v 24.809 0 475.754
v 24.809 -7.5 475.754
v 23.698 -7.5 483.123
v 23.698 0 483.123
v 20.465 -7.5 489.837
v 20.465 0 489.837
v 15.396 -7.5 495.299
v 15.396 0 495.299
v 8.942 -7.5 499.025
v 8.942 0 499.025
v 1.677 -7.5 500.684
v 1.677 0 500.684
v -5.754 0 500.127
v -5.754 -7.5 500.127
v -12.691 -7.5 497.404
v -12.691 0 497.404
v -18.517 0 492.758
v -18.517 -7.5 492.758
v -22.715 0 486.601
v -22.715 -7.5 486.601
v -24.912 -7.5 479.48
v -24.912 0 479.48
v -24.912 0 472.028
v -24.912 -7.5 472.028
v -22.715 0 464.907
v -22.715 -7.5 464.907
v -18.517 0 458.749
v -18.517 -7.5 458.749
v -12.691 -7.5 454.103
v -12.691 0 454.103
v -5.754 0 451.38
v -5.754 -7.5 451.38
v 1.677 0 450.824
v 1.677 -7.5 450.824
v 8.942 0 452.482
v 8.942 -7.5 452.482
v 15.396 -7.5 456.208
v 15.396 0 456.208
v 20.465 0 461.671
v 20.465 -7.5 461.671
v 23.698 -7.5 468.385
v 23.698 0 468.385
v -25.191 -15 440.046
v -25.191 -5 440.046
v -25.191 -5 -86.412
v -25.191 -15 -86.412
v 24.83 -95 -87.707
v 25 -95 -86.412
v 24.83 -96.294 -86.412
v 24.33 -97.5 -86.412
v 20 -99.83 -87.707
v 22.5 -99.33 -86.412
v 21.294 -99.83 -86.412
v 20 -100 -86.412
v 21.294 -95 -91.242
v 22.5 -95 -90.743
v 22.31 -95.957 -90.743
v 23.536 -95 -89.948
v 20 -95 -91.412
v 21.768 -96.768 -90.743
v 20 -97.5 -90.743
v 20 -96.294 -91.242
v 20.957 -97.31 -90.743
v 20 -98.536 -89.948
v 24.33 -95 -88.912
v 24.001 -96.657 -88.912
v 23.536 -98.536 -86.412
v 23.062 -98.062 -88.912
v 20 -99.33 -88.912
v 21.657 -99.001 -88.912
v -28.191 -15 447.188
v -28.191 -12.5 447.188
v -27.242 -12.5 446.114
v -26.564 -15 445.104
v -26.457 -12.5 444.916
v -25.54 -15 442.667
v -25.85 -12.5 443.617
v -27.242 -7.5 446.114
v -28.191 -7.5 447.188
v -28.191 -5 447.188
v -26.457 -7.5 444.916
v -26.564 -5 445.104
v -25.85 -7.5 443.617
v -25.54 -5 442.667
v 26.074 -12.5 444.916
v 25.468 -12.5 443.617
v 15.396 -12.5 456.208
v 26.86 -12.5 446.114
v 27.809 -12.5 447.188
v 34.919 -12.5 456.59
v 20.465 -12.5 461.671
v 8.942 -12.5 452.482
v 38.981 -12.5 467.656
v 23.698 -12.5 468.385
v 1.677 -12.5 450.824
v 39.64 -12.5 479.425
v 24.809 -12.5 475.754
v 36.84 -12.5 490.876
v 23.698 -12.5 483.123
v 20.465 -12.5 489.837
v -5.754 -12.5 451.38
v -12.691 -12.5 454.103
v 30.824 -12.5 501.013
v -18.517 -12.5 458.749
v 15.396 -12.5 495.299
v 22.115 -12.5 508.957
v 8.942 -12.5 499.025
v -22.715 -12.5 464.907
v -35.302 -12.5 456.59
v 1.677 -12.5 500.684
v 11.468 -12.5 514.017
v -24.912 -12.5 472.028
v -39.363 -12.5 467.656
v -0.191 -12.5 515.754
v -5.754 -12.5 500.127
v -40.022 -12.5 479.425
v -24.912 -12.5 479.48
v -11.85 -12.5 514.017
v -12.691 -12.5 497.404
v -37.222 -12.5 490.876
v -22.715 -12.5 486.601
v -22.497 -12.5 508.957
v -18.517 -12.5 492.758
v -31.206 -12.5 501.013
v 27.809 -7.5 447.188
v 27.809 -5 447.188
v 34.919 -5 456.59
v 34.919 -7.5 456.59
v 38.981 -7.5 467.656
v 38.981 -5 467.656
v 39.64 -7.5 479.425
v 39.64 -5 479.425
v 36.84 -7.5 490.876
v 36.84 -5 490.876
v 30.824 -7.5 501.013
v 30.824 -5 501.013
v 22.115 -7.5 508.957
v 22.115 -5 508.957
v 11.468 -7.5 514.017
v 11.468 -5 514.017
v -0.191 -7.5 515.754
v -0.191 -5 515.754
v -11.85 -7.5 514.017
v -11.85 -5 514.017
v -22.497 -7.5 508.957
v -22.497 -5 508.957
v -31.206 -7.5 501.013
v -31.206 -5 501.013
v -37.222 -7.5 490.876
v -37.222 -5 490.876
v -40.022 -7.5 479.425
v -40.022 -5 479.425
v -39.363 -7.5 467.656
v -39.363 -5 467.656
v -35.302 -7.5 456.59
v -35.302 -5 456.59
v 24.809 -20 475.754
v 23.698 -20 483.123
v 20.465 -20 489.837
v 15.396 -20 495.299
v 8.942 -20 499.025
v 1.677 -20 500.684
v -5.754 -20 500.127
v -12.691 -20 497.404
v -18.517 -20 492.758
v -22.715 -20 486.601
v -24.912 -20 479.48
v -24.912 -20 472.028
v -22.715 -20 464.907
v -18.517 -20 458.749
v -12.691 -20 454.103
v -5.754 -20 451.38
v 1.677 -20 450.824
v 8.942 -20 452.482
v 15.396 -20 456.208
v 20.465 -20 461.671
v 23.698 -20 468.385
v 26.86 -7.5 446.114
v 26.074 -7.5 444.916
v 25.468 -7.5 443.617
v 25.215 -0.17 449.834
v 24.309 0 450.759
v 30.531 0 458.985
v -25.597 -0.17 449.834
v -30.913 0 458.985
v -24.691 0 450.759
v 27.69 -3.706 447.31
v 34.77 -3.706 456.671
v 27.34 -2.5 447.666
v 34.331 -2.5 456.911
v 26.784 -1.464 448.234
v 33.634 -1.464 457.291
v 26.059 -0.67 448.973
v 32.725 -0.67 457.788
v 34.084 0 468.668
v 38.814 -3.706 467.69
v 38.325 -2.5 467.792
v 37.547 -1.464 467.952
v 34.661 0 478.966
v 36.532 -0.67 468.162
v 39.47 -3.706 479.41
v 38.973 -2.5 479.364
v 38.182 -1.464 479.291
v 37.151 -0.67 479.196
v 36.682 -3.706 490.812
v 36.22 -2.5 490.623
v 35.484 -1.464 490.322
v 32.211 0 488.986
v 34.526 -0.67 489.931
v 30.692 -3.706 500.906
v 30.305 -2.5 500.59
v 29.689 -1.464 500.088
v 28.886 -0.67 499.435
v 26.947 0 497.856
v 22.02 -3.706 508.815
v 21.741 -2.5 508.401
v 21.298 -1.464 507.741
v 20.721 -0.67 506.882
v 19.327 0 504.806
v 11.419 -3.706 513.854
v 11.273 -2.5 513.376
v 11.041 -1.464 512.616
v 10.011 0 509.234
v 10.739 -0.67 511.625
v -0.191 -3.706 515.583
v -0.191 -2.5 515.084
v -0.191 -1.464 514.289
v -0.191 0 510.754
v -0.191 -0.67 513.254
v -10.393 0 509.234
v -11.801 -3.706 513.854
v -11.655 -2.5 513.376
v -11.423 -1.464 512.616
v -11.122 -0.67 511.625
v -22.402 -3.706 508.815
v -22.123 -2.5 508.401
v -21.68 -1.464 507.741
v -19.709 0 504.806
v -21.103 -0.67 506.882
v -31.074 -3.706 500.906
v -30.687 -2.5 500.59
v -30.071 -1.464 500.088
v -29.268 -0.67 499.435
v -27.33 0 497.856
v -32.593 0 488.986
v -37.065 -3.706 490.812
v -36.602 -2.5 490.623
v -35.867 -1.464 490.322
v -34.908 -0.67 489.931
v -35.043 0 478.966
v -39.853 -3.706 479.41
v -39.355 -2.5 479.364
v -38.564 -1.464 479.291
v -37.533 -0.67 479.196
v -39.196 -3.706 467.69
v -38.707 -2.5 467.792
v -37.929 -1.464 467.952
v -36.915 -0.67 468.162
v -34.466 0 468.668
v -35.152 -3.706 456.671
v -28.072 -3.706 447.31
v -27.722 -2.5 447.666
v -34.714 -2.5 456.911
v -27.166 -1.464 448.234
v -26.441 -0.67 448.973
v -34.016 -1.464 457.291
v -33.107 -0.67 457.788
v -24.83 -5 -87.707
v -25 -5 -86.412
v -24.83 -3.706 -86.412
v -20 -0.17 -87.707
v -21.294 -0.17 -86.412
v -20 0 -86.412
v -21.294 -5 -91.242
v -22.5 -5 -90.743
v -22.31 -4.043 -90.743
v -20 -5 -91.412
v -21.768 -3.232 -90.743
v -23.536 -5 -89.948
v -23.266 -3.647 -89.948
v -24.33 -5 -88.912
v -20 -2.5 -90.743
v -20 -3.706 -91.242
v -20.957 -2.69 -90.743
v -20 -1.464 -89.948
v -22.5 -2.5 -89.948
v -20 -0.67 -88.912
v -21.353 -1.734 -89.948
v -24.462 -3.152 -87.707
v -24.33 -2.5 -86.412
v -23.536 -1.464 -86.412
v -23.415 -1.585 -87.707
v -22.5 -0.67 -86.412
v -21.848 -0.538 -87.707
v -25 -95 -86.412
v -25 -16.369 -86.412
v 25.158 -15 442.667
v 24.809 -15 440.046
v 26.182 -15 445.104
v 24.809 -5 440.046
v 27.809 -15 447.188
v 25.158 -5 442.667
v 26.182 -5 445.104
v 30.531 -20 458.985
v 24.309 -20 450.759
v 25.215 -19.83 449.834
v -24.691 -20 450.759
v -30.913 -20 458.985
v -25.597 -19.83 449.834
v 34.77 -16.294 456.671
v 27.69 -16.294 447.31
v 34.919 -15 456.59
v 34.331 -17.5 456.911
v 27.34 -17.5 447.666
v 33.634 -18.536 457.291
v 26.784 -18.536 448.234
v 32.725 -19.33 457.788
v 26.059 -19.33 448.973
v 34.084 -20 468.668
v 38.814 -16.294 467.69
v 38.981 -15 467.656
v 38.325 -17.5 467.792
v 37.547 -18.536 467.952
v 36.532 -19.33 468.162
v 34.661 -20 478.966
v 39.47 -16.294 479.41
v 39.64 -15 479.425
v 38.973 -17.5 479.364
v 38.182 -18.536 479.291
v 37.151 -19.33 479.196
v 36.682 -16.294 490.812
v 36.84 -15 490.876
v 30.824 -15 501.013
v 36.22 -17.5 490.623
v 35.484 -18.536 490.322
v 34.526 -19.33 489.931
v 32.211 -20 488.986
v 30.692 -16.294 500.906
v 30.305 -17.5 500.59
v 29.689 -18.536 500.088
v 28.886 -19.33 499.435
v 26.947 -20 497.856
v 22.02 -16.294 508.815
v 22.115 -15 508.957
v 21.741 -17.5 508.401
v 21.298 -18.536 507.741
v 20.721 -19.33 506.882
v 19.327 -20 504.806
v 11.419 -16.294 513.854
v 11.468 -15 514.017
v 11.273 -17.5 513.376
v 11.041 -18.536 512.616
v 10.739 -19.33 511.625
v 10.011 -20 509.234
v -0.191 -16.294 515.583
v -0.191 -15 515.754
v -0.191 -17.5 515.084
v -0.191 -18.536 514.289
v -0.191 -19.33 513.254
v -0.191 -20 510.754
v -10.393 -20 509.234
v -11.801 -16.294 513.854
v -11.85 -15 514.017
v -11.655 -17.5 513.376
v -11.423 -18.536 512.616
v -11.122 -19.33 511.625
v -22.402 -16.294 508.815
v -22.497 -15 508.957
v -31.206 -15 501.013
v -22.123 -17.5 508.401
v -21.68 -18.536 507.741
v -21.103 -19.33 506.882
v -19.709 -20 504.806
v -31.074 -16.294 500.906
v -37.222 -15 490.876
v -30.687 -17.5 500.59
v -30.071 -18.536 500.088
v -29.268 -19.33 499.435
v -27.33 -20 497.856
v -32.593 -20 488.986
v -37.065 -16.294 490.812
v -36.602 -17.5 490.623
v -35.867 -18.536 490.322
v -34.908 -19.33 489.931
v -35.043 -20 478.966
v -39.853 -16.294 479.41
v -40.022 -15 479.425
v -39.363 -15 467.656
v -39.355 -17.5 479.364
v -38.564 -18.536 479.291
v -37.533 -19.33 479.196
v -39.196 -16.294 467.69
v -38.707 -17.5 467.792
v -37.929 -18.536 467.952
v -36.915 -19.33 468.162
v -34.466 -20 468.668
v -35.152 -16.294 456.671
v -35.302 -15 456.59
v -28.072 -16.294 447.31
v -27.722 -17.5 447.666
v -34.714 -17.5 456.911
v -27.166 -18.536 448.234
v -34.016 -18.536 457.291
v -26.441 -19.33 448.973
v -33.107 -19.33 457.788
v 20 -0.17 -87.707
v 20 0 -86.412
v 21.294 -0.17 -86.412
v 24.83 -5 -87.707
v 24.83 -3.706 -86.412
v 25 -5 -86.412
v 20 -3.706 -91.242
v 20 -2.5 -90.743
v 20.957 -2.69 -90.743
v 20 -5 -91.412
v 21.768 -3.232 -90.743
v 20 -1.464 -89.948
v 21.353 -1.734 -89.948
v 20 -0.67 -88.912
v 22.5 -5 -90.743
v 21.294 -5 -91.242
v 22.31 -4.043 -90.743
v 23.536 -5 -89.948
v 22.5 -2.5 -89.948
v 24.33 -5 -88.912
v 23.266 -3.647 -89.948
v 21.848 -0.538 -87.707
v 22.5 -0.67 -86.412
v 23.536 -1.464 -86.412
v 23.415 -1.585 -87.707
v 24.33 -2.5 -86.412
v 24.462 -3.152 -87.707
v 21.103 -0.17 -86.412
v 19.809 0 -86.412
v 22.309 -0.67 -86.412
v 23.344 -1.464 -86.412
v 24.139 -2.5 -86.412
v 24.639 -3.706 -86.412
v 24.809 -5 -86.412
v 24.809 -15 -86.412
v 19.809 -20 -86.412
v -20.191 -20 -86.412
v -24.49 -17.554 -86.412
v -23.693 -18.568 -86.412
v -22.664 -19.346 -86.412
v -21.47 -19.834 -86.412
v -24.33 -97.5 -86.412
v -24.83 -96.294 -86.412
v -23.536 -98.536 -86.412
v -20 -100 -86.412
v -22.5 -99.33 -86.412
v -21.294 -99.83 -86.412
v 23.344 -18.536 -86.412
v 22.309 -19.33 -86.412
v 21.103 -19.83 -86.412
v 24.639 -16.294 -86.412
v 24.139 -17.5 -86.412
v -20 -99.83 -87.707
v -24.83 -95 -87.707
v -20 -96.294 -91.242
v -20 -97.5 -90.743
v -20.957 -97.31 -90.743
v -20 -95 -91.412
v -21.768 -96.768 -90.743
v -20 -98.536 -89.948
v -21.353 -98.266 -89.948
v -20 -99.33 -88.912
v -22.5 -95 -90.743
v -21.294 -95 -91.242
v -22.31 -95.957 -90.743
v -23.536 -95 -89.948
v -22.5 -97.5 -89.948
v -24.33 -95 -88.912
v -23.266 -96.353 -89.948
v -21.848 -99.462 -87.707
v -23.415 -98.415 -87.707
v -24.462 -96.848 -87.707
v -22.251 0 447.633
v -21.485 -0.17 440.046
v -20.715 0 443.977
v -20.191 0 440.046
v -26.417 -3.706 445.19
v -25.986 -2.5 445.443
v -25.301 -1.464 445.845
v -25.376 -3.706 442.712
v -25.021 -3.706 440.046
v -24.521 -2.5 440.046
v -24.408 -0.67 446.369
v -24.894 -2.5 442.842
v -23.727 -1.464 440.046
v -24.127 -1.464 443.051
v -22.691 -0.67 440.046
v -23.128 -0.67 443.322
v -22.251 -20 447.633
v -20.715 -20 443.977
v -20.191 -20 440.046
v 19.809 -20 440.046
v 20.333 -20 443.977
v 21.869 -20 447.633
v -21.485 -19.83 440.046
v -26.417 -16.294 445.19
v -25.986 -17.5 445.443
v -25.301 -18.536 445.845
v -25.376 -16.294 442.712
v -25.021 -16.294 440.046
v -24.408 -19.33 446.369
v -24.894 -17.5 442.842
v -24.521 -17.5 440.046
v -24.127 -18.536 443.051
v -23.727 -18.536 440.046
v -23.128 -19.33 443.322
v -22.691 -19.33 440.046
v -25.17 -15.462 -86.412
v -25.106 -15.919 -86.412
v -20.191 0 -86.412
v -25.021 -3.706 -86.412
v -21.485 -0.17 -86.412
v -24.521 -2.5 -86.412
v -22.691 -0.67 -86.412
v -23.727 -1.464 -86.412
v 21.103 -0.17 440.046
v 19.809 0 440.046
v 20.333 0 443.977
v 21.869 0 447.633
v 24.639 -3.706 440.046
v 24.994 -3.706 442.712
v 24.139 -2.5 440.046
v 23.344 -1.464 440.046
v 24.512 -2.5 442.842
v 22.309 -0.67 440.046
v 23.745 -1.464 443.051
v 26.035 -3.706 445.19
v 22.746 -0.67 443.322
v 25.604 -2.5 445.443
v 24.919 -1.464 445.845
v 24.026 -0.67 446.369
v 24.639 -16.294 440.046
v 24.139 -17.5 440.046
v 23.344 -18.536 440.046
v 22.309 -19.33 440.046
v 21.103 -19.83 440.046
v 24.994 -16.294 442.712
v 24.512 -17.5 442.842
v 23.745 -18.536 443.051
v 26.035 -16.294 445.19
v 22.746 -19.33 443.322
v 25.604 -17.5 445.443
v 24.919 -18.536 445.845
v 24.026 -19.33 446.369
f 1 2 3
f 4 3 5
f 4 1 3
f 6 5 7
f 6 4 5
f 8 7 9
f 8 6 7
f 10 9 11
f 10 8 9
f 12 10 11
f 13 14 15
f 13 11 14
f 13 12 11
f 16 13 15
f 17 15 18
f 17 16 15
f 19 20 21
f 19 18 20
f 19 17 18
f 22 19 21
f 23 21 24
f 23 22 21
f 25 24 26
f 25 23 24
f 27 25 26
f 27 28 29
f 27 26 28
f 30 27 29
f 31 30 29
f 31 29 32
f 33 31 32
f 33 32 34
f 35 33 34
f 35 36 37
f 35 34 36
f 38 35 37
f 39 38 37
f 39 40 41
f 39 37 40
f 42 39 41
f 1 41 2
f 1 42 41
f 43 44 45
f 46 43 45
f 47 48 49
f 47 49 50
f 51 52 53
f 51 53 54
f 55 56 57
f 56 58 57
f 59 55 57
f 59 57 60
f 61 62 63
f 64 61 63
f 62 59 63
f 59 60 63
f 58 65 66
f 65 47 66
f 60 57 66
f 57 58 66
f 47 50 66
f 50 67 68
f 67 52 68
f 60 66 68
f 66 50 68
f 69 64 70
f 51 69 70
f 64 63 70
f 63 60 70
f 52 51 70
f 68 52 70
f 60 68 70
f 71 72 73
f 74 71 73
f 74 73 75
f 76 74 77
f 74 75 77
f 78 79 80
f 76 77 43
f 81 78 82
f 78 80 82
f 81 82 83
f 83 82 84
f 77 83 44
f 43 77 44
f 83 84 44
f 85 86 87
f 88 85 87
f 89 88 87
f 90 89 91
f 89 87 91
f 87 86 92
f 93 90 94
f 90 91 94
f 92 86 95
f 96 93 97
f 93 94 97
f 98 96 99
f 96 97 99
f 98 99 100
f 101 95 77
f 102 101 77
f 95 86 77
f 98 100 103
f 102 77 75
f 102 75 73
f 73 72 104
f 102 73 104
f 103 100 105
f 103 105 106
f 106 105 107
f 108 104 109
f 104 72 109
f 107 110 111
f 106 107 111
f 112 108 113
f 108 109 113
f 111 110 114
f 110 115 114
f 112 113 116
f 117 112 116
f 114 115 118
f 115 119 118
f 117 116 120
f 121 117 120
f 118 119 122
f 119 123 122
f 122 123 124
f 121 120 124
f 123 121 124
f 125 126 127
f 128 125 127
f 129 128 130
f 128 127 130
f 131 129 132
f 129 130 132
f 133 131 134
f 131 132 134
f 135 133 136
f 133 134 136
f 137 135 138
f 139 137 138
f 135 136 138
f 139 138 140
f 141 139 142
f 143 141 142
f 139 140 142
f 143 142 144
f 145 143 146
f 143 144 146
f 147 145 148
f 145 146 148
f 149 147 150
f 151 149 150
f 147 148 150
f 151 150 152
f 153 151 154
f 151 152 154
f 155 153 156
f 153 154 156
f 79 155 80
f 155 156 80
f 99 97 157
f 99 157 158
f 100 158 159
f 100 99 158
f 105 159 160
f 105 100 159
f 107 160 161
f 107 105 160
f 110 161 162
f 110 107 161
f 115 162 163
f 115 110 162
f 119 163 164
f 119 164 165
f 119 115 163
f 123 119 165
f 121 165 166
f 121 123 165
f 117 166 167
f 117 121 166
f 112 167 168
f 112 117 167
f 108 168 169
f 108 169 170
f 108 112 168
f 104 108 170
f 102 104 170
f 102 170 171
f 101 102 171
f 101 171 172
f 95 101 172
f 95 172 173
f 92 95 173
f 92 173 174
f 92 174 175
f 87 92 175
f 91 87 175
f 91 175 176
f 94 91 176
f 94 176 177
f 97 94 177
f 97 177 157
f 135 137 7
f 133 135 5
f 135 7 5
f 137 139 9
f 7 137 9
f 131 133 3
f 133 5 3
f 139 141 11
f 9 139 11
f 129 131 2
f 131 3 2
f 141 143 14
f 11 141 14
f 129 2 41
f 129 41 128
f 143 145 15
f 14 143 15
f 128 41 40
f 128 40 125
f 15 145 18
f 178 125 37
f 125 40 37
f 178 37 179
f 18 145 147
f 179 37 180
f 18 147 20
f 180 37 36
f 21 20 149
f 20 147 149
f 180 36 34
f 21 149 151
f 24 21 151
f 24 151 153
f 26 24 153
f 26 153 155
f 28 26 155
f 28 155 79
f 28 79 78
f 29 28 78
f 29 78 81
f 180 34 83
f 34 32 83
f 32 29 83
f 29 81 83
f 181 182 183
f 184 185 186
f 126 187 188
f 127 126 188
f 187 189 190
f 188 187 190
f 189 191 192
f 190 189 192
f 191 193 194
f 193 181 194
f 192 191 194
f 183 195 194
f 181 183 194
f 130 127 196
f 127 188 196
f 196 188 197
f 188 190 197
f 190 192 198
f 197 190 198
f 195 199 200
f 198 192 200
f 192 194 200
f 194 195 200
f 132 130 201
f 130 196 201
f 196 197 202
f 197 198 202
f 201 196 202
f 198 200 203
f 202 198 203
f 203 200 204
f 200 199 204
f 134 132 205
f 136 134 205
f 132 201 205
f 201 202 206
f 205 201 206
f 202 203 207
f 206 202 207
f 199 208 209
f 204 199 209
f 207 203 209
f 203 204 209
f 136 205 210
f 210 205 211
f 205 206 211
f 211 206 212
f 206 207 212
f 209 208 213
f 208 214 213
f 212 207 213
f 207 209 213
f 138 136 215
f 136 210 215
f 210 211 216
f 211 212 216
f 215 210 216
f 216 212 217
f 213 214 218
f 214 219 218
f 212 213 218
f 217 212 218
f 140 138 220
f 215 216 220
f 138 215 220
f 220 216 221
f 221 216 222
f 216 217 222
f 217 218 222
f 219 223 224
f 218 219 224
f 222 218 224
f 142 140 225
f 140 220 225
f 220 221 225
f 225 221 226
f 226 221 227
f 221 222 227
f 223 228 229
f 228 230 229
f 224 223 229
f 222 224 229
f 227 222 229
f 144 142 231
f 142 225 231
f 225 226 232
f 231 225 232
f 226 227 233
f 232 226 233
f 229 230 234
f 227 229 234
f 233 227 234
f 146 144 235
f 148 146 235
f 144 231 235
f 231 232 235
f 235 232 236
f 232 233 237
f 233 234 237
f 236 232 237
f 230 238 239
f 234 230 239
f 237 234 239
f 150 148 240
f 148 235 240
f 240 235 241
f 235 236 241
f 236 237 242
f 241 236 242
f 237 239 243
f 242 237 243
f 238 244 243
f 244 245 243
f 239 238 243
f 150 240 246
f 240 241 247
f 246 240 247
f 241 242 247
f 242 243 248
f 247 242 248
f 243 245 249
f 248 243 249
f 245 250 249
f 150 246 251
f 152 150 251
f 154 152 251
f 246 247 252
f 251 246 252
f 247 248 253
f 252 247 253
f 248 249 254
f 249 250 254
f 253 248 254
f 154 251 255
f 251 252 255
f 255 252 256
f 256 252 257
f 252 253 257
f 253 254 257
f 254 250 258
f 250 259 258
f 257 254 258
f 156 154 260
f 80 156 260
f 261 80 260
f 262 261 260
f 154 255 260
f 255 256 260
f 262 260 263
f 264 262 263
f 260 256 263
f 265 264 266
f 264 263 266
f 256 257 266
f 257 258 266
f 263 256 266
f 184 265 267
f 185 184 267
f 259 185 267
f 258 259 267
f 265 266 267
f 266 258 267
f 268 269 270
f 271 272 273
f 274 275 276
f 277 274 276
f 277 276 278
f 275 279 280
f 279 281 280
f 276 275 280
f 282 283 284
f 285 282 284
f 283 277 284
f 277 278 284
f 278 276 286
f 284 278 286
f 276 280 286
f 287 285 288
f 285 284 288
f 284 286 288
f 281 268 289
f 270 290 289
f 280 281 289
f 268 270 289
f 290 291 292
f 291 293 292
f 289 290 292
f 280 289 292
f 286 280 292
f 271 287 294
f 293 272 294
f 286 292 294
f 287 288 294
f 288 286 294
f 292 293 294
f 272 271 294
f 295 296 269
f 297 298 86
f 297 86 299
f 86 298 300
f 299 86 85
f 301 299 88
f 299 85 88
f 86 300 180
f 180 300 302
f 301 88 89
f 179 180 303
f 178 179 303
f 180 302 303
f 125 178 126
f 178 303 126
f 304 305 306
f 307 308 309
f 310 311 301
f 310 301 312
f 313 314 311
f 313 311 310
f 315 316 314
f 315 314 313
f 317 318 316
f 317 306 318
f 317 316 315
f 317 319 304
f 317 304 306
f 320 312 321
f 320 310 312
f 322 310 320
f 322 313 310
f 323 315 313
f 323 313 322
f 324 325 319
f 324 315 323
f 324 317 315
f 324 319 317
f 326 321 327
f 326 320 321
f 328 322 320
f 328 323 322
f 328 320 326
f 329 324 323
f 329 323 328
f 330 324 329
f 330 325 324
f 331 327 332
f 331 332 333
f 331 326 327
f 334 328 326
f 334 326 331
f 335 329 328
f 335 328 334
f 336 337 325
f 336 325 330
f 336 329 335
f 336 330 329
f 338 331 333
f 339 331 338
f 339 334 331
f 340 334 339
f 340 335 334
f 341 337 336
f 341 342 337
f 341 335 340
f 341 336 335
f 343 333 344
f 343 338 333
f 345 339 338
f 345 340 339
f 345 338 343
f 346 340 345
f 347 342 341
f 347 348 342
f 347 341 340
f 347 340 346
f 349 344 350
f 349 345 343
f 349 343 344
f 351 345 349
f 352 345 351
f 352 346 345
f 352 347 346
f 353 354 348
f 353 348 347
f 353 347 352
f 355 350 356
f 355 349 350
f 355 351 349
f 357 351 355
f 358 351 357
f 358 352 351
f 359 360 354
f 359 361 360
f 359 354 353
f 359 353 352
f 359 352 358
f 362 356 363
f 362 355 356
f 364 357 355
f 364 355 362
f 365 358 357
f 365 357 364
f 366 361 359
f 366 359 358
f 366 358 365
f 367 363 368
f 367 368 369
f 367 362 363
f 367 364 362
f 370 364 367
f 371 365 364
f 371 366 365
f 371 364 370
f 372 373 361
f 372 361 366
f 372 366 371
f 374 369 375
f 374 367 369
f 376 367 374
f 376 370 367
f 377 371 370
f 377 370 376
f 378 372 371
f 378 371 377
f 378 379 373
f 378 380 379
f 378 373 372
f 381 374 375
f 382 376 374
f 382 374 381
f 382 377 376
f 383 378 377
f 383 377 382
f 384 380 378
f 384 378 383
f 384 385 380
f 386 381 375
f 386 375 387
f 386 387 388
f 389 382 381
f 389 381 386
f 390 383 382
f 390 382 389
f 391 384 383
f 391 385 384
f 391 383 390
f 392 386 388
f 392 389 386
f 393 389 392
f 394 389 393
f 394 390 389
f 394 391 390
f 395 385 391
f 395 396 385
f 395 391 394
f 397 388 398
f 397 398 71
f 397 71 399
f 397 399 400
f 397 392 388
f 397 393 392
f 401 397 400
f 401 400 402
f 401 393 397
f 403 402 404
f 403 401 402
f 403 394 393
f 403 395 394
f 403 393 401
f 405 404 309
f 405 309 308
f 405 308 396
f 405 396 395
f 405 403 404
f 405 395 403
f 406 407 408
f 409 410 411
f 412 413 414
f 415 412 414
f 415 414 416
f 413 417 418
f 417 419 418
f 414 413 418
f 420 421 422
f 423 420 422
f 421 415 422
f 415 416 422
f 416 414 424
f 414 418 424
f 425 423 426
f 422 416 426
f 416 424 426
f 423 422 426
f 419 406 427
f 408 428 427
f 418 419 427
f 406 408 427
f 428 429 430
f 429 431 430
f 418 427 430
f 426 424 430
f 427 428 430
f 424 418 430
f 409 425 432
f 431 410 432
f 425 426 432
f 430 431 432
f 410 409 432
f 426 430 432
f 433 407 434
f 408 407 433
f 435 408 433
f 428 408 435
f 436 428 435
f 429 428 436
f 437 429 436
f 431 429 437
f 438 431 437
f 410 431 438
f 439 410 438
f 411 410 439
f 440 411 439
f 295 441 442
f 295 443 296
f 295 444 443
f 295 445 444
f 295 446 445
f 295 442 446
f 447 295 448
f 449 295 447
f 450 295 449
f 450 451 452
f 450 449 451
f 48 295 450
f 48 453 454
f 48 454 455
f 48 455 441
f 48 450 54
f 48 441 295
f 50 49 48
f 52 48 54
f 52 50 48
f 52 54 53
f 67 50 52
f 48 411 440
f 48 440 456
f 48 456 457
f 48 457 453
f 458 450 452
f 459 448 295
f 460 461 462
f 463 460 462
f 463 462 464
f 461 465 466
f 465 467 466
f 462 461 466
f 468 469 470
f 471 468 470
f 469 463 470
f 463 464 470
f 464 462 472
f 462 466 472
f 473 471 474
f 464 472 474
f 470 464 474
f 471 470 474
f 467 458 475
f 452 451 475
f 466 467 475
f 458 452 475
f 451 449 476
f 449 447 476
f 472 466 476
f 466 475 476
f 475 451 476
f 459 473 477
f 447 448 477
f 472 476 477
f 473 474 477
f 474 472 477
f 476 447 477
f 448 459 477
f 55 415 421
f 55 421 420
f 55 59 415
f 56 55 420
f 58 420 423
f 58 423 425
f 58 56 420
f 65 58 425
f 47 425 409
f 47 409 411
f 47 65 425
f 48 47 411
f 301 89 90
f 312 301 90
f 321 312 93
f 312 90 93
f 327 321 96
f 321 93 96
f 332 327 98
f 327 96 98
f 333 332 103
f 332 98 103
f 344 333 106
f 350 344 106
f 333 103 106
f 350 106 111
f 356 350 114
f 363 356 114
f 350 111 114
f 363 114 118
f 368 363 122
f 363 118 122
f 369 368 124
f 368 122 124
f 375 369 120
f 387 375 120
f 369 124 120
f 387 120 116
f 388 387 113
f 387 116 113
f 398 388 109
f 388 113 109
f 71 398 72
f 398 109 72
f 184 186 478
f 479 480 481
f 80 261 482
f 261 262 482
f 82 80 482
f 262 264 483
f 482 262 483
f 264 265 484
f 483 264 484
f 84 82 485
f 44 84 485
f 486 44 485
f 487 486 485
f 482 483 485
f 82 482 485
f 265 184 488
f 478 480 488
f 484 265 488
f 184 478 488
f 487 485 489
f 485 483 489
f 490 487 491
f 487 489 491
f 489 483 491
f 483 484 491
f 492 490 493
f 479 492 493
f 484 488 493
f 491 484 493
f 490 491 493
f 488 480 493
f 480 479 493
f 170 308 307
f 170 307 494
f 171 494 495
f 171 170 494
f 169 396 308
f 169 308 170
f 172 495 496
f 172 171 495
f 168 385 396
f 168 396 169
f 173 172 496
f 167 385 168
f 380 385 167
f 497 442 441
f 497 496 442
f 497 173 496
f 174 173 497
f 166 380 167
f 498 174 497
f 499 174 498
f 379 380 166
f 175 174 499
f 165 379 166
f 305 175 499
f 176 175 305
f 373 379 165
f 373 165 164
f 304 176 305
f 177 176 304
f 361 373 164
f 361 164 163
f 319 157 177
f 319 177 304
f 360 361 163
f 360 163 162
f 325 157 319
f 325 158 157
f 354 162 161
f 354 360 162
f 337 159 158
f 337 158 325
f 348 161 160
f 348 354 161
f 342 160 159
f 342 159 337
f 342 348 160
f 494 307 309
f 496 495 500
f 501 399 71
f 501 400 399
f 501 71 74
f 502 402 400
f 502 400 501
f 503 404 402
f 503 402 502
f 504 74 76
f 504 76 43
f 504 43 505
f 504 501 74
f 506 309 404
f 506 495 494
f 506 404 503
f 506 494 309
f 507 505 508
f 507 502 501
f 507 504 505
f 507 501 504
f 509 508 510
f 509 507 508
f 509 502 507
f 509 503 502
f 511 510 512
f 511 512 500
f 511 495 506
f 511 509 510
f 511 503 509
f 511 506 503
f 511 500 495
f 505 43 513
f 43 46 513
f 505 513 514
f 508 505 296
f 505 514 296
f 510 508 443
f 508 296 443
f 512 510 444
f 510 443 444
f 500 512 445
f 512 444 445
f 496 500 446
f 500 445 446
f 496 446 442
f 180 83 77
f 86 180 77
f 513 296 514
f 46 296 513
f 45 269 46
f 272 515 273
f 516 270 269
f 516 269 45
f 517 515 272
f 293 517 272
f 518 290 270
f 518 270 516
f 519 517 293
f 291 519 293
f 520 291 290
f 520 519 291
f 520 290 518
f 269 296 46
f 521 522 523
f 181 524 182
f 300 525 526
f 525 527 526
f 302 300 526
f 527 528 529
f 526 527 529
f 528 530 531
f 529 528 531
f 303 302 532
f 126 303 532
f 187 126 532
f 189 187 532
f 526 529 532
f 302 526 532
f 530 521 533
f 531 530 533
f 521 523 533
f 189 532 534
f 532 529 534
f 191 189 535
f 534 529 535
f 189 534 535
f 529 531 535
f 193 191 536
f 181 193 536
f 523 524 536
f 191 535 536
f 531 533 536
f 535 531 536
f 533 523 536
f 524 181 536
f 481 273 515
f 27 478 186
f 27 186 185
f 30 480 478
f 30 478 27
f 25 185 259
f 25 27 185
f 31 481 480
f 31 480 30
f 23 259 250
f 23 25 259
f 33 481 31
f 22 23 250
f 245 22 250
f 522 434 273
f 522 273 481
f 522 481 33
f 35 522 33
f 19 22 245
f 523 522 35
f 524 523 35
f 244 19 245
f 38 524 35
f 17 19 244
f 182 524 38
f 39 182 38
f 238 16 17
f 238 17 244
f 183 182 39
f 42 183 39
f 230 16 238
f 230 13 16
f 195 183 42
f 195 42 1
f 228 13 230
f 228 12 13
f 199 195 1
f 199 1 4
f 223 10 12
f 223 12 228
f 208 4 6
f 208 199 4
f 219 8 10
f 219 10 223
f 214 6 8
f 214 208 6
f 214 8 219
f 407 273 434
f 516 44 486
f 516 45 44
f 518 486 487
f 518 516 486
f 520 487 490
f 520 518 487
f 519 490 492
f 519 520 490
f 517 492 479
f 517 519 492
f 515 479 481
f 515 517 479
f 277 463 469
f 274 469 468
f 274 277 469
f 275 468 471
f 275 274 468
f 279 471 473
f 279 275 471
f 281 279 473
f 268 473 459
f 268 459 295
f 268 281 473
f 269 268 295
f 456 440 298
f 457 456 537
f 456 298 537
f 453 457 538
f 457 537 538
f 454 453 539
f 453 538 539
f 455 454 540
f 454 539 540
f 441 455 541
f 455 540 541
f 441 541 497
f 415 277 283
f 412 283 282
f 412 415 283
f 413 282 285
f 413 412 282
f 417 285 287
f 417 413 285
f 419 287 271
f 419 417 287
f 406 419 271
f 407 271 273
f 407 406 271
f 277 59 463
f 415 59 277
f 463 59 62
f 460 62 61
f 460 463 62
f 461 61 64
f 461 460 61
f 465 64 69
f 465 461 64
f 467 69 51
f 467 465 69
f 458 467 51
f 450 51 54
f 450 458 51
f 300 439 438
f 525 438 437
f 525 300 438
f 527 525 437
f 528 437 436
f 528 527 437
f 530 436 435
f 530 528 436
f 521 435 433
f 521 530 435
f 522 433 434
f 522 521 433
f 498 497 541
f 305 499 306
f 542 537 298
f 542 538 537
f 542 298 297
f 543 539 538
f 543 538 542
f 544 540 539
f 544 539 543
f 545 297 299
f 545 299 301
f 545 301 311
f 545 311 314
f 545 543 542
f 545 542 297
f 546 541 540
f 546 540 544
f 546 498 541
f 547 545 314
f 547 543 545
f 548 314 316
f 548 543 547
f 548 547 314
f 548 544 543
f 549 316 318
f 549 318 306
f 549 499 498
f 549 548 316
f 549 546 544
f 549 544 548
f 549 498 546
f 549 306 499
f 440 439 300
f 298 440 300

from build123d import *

# Parameters (mm, degrees)
F0_R        = 25
F1_DEPTH    = 20
F3_DEPTH    = 70
F4_R        = 5
F6_DEPTH    = 25
F7_T1_DEPTH = 17.5
F7_T3_DEPTH = 30
F8_R        = 4.99999


# Not quite as in the source:
# - a fillet or chamfer that OpenCascade refuses, or shapes differently, is made with other operations: its cross-section is extruded or revolved along the edge and cut away or added
# - a fillet or chamfer is up to 0.001 mm smaller than in the source, because OpenCascade refuses the exact size


with BuildPart() as f1:
    # F0 (on Front) → F1 (new body)
    with BuildSketch(Plane.XZ):
        with BuildLine():
            Line((-25.1910626888, 440.0464960357), (-25.1910626888, -86.4124843018))
            Line((-25.1910626888, -86.4124843018), (24.8089373112, -86.4124843018))
            Line((24.8089373112, -86.4124843018), (24.8089373112, 440.0464960357))
            ThreePointArc((24.8089373112, 440.0464960357), (25.5893928539, 443.9194793819), (27.8089373112, 447.1879244642))
            ThreePointArc((27.8089373112, 447.1879244642), (-0.1910626888, 515.7536381784), (-28.1910626888, 447.1879244642))
            ThreePointArc((-28.1910626888, 447.1879244642), (-25.9715182315, 443.9194793819), (-25.1910626888, 440.0464960357))
        make_face()
        with Locations((-0.1910626888, 475.7536381784)):
            Circle(F0_R, mode=Mode.SUBTRACT)
    extrude(amount=F1_DEPTH)

    # F2 (on face) → F3 (cut, symmetric)
    with BuildSketch(Plane(origin=(-25.1910626888, 0, 0), x_dir=(0, -1, 0), z_dir=(-1, 0, 0))):
        Polygon((12.5, 447.1879244642), (12.5, 450.7536381784), (12.5, 515.7536381784), (7.5, 515.7536381784), (7.5, 450.7536381784), (7.5, 447.1879244642), (7.5, 443.61721025), (12.5, 443.61721025), align=None)
    extrude(amount=F3_DEPTH, both=True, mode=Mode.SUBTRACT)

    # F4
    f4_edges = [f1.edges().sort_by_distance(p)[0] for p in [
        (-25.191063, -20, 176.817006),
        (-25.191063, 0, 176.817006),
    ]]
    fillet(f4_edges, radius=F4_R)

    # F5 (on Right) → F6 (join, symmetric)
    with BuildSketch(Plane.YZ):
        Polygon((0, -91.4124843018), (0, -86.4124843018), (-20, -86.4124843018), (-100, -86.4124843018), (-100, -91.4124843018), align=None)
    extrude(amount=F6_DEPTH, both=True)

    # F7: fillet of radius 5 on 4 edges, made by hand

    # F7_s2 → F7_t1 (cut)
    with BuildSketch(Plane.XY.offset(-103.9124843018)):
        with BuildLine():
            ThreePointArc((-20, 0), (-23.5355339059, -1.4644660941), (-25, -5))
            Line((-25, -5), (-25, 0))
            Line((-25, 0), (-20, 0))
        make_face()
    extrude(amount=F7_T1_DEPTH, mode=Mode.SUBTRACT)

    # F7_s4 → F7_t3 (cut)
    with BuildSketch(Plane.XY.offset(-103.9124843018)):
        with BuildLine():
            ThreePointArc((20, 0), (23.5355339059, -1.4644660941), (25, -5))
            Line((25, -5), (25, 0))
            Line((25, 0), (20, 0))
        make_face()
        with BuildLine():
            ThreePointArc((-20, -100), (-23.5355339059, -98.5355339059), (-25, -95))
            Line((-25, -95), (-25, -100))
            Line((-25, -100), (-20, -100))
        make_face()
        with BuildLine():
            ThreePointArc((25, -95), (23.5355339059, -98.5355339059), (20, -100))
            Line((20, -100), (25, -100))
            Line((25, -100), (25, -95))
        make_face()
    extrude(amount=F7_T3_DEPTH, mode=Mode.SUBTRACT)

    # F8 (radius 5 in the source; OpenCascade refuses exactly that, so slightly less here)
    f8_edges = [f1.edges().sort_by_distance(p)[0] for p in [
        (23.535534, -98.535534, -91.412484),
        (25, -50, -91.412484),
        (23.535534, -1.464466, -91.412484),
        (0, 0, -91.412484),
        (-23.535534, -1.464466, -91.412484),
        (-25, -50, -91.412484),
        (-23.535534, -98.535534, -91.412484),
        (0, -100, -91.412484),
    ]]
    fillet(f8_edges, radius=F8_R)


solid = f1.part
